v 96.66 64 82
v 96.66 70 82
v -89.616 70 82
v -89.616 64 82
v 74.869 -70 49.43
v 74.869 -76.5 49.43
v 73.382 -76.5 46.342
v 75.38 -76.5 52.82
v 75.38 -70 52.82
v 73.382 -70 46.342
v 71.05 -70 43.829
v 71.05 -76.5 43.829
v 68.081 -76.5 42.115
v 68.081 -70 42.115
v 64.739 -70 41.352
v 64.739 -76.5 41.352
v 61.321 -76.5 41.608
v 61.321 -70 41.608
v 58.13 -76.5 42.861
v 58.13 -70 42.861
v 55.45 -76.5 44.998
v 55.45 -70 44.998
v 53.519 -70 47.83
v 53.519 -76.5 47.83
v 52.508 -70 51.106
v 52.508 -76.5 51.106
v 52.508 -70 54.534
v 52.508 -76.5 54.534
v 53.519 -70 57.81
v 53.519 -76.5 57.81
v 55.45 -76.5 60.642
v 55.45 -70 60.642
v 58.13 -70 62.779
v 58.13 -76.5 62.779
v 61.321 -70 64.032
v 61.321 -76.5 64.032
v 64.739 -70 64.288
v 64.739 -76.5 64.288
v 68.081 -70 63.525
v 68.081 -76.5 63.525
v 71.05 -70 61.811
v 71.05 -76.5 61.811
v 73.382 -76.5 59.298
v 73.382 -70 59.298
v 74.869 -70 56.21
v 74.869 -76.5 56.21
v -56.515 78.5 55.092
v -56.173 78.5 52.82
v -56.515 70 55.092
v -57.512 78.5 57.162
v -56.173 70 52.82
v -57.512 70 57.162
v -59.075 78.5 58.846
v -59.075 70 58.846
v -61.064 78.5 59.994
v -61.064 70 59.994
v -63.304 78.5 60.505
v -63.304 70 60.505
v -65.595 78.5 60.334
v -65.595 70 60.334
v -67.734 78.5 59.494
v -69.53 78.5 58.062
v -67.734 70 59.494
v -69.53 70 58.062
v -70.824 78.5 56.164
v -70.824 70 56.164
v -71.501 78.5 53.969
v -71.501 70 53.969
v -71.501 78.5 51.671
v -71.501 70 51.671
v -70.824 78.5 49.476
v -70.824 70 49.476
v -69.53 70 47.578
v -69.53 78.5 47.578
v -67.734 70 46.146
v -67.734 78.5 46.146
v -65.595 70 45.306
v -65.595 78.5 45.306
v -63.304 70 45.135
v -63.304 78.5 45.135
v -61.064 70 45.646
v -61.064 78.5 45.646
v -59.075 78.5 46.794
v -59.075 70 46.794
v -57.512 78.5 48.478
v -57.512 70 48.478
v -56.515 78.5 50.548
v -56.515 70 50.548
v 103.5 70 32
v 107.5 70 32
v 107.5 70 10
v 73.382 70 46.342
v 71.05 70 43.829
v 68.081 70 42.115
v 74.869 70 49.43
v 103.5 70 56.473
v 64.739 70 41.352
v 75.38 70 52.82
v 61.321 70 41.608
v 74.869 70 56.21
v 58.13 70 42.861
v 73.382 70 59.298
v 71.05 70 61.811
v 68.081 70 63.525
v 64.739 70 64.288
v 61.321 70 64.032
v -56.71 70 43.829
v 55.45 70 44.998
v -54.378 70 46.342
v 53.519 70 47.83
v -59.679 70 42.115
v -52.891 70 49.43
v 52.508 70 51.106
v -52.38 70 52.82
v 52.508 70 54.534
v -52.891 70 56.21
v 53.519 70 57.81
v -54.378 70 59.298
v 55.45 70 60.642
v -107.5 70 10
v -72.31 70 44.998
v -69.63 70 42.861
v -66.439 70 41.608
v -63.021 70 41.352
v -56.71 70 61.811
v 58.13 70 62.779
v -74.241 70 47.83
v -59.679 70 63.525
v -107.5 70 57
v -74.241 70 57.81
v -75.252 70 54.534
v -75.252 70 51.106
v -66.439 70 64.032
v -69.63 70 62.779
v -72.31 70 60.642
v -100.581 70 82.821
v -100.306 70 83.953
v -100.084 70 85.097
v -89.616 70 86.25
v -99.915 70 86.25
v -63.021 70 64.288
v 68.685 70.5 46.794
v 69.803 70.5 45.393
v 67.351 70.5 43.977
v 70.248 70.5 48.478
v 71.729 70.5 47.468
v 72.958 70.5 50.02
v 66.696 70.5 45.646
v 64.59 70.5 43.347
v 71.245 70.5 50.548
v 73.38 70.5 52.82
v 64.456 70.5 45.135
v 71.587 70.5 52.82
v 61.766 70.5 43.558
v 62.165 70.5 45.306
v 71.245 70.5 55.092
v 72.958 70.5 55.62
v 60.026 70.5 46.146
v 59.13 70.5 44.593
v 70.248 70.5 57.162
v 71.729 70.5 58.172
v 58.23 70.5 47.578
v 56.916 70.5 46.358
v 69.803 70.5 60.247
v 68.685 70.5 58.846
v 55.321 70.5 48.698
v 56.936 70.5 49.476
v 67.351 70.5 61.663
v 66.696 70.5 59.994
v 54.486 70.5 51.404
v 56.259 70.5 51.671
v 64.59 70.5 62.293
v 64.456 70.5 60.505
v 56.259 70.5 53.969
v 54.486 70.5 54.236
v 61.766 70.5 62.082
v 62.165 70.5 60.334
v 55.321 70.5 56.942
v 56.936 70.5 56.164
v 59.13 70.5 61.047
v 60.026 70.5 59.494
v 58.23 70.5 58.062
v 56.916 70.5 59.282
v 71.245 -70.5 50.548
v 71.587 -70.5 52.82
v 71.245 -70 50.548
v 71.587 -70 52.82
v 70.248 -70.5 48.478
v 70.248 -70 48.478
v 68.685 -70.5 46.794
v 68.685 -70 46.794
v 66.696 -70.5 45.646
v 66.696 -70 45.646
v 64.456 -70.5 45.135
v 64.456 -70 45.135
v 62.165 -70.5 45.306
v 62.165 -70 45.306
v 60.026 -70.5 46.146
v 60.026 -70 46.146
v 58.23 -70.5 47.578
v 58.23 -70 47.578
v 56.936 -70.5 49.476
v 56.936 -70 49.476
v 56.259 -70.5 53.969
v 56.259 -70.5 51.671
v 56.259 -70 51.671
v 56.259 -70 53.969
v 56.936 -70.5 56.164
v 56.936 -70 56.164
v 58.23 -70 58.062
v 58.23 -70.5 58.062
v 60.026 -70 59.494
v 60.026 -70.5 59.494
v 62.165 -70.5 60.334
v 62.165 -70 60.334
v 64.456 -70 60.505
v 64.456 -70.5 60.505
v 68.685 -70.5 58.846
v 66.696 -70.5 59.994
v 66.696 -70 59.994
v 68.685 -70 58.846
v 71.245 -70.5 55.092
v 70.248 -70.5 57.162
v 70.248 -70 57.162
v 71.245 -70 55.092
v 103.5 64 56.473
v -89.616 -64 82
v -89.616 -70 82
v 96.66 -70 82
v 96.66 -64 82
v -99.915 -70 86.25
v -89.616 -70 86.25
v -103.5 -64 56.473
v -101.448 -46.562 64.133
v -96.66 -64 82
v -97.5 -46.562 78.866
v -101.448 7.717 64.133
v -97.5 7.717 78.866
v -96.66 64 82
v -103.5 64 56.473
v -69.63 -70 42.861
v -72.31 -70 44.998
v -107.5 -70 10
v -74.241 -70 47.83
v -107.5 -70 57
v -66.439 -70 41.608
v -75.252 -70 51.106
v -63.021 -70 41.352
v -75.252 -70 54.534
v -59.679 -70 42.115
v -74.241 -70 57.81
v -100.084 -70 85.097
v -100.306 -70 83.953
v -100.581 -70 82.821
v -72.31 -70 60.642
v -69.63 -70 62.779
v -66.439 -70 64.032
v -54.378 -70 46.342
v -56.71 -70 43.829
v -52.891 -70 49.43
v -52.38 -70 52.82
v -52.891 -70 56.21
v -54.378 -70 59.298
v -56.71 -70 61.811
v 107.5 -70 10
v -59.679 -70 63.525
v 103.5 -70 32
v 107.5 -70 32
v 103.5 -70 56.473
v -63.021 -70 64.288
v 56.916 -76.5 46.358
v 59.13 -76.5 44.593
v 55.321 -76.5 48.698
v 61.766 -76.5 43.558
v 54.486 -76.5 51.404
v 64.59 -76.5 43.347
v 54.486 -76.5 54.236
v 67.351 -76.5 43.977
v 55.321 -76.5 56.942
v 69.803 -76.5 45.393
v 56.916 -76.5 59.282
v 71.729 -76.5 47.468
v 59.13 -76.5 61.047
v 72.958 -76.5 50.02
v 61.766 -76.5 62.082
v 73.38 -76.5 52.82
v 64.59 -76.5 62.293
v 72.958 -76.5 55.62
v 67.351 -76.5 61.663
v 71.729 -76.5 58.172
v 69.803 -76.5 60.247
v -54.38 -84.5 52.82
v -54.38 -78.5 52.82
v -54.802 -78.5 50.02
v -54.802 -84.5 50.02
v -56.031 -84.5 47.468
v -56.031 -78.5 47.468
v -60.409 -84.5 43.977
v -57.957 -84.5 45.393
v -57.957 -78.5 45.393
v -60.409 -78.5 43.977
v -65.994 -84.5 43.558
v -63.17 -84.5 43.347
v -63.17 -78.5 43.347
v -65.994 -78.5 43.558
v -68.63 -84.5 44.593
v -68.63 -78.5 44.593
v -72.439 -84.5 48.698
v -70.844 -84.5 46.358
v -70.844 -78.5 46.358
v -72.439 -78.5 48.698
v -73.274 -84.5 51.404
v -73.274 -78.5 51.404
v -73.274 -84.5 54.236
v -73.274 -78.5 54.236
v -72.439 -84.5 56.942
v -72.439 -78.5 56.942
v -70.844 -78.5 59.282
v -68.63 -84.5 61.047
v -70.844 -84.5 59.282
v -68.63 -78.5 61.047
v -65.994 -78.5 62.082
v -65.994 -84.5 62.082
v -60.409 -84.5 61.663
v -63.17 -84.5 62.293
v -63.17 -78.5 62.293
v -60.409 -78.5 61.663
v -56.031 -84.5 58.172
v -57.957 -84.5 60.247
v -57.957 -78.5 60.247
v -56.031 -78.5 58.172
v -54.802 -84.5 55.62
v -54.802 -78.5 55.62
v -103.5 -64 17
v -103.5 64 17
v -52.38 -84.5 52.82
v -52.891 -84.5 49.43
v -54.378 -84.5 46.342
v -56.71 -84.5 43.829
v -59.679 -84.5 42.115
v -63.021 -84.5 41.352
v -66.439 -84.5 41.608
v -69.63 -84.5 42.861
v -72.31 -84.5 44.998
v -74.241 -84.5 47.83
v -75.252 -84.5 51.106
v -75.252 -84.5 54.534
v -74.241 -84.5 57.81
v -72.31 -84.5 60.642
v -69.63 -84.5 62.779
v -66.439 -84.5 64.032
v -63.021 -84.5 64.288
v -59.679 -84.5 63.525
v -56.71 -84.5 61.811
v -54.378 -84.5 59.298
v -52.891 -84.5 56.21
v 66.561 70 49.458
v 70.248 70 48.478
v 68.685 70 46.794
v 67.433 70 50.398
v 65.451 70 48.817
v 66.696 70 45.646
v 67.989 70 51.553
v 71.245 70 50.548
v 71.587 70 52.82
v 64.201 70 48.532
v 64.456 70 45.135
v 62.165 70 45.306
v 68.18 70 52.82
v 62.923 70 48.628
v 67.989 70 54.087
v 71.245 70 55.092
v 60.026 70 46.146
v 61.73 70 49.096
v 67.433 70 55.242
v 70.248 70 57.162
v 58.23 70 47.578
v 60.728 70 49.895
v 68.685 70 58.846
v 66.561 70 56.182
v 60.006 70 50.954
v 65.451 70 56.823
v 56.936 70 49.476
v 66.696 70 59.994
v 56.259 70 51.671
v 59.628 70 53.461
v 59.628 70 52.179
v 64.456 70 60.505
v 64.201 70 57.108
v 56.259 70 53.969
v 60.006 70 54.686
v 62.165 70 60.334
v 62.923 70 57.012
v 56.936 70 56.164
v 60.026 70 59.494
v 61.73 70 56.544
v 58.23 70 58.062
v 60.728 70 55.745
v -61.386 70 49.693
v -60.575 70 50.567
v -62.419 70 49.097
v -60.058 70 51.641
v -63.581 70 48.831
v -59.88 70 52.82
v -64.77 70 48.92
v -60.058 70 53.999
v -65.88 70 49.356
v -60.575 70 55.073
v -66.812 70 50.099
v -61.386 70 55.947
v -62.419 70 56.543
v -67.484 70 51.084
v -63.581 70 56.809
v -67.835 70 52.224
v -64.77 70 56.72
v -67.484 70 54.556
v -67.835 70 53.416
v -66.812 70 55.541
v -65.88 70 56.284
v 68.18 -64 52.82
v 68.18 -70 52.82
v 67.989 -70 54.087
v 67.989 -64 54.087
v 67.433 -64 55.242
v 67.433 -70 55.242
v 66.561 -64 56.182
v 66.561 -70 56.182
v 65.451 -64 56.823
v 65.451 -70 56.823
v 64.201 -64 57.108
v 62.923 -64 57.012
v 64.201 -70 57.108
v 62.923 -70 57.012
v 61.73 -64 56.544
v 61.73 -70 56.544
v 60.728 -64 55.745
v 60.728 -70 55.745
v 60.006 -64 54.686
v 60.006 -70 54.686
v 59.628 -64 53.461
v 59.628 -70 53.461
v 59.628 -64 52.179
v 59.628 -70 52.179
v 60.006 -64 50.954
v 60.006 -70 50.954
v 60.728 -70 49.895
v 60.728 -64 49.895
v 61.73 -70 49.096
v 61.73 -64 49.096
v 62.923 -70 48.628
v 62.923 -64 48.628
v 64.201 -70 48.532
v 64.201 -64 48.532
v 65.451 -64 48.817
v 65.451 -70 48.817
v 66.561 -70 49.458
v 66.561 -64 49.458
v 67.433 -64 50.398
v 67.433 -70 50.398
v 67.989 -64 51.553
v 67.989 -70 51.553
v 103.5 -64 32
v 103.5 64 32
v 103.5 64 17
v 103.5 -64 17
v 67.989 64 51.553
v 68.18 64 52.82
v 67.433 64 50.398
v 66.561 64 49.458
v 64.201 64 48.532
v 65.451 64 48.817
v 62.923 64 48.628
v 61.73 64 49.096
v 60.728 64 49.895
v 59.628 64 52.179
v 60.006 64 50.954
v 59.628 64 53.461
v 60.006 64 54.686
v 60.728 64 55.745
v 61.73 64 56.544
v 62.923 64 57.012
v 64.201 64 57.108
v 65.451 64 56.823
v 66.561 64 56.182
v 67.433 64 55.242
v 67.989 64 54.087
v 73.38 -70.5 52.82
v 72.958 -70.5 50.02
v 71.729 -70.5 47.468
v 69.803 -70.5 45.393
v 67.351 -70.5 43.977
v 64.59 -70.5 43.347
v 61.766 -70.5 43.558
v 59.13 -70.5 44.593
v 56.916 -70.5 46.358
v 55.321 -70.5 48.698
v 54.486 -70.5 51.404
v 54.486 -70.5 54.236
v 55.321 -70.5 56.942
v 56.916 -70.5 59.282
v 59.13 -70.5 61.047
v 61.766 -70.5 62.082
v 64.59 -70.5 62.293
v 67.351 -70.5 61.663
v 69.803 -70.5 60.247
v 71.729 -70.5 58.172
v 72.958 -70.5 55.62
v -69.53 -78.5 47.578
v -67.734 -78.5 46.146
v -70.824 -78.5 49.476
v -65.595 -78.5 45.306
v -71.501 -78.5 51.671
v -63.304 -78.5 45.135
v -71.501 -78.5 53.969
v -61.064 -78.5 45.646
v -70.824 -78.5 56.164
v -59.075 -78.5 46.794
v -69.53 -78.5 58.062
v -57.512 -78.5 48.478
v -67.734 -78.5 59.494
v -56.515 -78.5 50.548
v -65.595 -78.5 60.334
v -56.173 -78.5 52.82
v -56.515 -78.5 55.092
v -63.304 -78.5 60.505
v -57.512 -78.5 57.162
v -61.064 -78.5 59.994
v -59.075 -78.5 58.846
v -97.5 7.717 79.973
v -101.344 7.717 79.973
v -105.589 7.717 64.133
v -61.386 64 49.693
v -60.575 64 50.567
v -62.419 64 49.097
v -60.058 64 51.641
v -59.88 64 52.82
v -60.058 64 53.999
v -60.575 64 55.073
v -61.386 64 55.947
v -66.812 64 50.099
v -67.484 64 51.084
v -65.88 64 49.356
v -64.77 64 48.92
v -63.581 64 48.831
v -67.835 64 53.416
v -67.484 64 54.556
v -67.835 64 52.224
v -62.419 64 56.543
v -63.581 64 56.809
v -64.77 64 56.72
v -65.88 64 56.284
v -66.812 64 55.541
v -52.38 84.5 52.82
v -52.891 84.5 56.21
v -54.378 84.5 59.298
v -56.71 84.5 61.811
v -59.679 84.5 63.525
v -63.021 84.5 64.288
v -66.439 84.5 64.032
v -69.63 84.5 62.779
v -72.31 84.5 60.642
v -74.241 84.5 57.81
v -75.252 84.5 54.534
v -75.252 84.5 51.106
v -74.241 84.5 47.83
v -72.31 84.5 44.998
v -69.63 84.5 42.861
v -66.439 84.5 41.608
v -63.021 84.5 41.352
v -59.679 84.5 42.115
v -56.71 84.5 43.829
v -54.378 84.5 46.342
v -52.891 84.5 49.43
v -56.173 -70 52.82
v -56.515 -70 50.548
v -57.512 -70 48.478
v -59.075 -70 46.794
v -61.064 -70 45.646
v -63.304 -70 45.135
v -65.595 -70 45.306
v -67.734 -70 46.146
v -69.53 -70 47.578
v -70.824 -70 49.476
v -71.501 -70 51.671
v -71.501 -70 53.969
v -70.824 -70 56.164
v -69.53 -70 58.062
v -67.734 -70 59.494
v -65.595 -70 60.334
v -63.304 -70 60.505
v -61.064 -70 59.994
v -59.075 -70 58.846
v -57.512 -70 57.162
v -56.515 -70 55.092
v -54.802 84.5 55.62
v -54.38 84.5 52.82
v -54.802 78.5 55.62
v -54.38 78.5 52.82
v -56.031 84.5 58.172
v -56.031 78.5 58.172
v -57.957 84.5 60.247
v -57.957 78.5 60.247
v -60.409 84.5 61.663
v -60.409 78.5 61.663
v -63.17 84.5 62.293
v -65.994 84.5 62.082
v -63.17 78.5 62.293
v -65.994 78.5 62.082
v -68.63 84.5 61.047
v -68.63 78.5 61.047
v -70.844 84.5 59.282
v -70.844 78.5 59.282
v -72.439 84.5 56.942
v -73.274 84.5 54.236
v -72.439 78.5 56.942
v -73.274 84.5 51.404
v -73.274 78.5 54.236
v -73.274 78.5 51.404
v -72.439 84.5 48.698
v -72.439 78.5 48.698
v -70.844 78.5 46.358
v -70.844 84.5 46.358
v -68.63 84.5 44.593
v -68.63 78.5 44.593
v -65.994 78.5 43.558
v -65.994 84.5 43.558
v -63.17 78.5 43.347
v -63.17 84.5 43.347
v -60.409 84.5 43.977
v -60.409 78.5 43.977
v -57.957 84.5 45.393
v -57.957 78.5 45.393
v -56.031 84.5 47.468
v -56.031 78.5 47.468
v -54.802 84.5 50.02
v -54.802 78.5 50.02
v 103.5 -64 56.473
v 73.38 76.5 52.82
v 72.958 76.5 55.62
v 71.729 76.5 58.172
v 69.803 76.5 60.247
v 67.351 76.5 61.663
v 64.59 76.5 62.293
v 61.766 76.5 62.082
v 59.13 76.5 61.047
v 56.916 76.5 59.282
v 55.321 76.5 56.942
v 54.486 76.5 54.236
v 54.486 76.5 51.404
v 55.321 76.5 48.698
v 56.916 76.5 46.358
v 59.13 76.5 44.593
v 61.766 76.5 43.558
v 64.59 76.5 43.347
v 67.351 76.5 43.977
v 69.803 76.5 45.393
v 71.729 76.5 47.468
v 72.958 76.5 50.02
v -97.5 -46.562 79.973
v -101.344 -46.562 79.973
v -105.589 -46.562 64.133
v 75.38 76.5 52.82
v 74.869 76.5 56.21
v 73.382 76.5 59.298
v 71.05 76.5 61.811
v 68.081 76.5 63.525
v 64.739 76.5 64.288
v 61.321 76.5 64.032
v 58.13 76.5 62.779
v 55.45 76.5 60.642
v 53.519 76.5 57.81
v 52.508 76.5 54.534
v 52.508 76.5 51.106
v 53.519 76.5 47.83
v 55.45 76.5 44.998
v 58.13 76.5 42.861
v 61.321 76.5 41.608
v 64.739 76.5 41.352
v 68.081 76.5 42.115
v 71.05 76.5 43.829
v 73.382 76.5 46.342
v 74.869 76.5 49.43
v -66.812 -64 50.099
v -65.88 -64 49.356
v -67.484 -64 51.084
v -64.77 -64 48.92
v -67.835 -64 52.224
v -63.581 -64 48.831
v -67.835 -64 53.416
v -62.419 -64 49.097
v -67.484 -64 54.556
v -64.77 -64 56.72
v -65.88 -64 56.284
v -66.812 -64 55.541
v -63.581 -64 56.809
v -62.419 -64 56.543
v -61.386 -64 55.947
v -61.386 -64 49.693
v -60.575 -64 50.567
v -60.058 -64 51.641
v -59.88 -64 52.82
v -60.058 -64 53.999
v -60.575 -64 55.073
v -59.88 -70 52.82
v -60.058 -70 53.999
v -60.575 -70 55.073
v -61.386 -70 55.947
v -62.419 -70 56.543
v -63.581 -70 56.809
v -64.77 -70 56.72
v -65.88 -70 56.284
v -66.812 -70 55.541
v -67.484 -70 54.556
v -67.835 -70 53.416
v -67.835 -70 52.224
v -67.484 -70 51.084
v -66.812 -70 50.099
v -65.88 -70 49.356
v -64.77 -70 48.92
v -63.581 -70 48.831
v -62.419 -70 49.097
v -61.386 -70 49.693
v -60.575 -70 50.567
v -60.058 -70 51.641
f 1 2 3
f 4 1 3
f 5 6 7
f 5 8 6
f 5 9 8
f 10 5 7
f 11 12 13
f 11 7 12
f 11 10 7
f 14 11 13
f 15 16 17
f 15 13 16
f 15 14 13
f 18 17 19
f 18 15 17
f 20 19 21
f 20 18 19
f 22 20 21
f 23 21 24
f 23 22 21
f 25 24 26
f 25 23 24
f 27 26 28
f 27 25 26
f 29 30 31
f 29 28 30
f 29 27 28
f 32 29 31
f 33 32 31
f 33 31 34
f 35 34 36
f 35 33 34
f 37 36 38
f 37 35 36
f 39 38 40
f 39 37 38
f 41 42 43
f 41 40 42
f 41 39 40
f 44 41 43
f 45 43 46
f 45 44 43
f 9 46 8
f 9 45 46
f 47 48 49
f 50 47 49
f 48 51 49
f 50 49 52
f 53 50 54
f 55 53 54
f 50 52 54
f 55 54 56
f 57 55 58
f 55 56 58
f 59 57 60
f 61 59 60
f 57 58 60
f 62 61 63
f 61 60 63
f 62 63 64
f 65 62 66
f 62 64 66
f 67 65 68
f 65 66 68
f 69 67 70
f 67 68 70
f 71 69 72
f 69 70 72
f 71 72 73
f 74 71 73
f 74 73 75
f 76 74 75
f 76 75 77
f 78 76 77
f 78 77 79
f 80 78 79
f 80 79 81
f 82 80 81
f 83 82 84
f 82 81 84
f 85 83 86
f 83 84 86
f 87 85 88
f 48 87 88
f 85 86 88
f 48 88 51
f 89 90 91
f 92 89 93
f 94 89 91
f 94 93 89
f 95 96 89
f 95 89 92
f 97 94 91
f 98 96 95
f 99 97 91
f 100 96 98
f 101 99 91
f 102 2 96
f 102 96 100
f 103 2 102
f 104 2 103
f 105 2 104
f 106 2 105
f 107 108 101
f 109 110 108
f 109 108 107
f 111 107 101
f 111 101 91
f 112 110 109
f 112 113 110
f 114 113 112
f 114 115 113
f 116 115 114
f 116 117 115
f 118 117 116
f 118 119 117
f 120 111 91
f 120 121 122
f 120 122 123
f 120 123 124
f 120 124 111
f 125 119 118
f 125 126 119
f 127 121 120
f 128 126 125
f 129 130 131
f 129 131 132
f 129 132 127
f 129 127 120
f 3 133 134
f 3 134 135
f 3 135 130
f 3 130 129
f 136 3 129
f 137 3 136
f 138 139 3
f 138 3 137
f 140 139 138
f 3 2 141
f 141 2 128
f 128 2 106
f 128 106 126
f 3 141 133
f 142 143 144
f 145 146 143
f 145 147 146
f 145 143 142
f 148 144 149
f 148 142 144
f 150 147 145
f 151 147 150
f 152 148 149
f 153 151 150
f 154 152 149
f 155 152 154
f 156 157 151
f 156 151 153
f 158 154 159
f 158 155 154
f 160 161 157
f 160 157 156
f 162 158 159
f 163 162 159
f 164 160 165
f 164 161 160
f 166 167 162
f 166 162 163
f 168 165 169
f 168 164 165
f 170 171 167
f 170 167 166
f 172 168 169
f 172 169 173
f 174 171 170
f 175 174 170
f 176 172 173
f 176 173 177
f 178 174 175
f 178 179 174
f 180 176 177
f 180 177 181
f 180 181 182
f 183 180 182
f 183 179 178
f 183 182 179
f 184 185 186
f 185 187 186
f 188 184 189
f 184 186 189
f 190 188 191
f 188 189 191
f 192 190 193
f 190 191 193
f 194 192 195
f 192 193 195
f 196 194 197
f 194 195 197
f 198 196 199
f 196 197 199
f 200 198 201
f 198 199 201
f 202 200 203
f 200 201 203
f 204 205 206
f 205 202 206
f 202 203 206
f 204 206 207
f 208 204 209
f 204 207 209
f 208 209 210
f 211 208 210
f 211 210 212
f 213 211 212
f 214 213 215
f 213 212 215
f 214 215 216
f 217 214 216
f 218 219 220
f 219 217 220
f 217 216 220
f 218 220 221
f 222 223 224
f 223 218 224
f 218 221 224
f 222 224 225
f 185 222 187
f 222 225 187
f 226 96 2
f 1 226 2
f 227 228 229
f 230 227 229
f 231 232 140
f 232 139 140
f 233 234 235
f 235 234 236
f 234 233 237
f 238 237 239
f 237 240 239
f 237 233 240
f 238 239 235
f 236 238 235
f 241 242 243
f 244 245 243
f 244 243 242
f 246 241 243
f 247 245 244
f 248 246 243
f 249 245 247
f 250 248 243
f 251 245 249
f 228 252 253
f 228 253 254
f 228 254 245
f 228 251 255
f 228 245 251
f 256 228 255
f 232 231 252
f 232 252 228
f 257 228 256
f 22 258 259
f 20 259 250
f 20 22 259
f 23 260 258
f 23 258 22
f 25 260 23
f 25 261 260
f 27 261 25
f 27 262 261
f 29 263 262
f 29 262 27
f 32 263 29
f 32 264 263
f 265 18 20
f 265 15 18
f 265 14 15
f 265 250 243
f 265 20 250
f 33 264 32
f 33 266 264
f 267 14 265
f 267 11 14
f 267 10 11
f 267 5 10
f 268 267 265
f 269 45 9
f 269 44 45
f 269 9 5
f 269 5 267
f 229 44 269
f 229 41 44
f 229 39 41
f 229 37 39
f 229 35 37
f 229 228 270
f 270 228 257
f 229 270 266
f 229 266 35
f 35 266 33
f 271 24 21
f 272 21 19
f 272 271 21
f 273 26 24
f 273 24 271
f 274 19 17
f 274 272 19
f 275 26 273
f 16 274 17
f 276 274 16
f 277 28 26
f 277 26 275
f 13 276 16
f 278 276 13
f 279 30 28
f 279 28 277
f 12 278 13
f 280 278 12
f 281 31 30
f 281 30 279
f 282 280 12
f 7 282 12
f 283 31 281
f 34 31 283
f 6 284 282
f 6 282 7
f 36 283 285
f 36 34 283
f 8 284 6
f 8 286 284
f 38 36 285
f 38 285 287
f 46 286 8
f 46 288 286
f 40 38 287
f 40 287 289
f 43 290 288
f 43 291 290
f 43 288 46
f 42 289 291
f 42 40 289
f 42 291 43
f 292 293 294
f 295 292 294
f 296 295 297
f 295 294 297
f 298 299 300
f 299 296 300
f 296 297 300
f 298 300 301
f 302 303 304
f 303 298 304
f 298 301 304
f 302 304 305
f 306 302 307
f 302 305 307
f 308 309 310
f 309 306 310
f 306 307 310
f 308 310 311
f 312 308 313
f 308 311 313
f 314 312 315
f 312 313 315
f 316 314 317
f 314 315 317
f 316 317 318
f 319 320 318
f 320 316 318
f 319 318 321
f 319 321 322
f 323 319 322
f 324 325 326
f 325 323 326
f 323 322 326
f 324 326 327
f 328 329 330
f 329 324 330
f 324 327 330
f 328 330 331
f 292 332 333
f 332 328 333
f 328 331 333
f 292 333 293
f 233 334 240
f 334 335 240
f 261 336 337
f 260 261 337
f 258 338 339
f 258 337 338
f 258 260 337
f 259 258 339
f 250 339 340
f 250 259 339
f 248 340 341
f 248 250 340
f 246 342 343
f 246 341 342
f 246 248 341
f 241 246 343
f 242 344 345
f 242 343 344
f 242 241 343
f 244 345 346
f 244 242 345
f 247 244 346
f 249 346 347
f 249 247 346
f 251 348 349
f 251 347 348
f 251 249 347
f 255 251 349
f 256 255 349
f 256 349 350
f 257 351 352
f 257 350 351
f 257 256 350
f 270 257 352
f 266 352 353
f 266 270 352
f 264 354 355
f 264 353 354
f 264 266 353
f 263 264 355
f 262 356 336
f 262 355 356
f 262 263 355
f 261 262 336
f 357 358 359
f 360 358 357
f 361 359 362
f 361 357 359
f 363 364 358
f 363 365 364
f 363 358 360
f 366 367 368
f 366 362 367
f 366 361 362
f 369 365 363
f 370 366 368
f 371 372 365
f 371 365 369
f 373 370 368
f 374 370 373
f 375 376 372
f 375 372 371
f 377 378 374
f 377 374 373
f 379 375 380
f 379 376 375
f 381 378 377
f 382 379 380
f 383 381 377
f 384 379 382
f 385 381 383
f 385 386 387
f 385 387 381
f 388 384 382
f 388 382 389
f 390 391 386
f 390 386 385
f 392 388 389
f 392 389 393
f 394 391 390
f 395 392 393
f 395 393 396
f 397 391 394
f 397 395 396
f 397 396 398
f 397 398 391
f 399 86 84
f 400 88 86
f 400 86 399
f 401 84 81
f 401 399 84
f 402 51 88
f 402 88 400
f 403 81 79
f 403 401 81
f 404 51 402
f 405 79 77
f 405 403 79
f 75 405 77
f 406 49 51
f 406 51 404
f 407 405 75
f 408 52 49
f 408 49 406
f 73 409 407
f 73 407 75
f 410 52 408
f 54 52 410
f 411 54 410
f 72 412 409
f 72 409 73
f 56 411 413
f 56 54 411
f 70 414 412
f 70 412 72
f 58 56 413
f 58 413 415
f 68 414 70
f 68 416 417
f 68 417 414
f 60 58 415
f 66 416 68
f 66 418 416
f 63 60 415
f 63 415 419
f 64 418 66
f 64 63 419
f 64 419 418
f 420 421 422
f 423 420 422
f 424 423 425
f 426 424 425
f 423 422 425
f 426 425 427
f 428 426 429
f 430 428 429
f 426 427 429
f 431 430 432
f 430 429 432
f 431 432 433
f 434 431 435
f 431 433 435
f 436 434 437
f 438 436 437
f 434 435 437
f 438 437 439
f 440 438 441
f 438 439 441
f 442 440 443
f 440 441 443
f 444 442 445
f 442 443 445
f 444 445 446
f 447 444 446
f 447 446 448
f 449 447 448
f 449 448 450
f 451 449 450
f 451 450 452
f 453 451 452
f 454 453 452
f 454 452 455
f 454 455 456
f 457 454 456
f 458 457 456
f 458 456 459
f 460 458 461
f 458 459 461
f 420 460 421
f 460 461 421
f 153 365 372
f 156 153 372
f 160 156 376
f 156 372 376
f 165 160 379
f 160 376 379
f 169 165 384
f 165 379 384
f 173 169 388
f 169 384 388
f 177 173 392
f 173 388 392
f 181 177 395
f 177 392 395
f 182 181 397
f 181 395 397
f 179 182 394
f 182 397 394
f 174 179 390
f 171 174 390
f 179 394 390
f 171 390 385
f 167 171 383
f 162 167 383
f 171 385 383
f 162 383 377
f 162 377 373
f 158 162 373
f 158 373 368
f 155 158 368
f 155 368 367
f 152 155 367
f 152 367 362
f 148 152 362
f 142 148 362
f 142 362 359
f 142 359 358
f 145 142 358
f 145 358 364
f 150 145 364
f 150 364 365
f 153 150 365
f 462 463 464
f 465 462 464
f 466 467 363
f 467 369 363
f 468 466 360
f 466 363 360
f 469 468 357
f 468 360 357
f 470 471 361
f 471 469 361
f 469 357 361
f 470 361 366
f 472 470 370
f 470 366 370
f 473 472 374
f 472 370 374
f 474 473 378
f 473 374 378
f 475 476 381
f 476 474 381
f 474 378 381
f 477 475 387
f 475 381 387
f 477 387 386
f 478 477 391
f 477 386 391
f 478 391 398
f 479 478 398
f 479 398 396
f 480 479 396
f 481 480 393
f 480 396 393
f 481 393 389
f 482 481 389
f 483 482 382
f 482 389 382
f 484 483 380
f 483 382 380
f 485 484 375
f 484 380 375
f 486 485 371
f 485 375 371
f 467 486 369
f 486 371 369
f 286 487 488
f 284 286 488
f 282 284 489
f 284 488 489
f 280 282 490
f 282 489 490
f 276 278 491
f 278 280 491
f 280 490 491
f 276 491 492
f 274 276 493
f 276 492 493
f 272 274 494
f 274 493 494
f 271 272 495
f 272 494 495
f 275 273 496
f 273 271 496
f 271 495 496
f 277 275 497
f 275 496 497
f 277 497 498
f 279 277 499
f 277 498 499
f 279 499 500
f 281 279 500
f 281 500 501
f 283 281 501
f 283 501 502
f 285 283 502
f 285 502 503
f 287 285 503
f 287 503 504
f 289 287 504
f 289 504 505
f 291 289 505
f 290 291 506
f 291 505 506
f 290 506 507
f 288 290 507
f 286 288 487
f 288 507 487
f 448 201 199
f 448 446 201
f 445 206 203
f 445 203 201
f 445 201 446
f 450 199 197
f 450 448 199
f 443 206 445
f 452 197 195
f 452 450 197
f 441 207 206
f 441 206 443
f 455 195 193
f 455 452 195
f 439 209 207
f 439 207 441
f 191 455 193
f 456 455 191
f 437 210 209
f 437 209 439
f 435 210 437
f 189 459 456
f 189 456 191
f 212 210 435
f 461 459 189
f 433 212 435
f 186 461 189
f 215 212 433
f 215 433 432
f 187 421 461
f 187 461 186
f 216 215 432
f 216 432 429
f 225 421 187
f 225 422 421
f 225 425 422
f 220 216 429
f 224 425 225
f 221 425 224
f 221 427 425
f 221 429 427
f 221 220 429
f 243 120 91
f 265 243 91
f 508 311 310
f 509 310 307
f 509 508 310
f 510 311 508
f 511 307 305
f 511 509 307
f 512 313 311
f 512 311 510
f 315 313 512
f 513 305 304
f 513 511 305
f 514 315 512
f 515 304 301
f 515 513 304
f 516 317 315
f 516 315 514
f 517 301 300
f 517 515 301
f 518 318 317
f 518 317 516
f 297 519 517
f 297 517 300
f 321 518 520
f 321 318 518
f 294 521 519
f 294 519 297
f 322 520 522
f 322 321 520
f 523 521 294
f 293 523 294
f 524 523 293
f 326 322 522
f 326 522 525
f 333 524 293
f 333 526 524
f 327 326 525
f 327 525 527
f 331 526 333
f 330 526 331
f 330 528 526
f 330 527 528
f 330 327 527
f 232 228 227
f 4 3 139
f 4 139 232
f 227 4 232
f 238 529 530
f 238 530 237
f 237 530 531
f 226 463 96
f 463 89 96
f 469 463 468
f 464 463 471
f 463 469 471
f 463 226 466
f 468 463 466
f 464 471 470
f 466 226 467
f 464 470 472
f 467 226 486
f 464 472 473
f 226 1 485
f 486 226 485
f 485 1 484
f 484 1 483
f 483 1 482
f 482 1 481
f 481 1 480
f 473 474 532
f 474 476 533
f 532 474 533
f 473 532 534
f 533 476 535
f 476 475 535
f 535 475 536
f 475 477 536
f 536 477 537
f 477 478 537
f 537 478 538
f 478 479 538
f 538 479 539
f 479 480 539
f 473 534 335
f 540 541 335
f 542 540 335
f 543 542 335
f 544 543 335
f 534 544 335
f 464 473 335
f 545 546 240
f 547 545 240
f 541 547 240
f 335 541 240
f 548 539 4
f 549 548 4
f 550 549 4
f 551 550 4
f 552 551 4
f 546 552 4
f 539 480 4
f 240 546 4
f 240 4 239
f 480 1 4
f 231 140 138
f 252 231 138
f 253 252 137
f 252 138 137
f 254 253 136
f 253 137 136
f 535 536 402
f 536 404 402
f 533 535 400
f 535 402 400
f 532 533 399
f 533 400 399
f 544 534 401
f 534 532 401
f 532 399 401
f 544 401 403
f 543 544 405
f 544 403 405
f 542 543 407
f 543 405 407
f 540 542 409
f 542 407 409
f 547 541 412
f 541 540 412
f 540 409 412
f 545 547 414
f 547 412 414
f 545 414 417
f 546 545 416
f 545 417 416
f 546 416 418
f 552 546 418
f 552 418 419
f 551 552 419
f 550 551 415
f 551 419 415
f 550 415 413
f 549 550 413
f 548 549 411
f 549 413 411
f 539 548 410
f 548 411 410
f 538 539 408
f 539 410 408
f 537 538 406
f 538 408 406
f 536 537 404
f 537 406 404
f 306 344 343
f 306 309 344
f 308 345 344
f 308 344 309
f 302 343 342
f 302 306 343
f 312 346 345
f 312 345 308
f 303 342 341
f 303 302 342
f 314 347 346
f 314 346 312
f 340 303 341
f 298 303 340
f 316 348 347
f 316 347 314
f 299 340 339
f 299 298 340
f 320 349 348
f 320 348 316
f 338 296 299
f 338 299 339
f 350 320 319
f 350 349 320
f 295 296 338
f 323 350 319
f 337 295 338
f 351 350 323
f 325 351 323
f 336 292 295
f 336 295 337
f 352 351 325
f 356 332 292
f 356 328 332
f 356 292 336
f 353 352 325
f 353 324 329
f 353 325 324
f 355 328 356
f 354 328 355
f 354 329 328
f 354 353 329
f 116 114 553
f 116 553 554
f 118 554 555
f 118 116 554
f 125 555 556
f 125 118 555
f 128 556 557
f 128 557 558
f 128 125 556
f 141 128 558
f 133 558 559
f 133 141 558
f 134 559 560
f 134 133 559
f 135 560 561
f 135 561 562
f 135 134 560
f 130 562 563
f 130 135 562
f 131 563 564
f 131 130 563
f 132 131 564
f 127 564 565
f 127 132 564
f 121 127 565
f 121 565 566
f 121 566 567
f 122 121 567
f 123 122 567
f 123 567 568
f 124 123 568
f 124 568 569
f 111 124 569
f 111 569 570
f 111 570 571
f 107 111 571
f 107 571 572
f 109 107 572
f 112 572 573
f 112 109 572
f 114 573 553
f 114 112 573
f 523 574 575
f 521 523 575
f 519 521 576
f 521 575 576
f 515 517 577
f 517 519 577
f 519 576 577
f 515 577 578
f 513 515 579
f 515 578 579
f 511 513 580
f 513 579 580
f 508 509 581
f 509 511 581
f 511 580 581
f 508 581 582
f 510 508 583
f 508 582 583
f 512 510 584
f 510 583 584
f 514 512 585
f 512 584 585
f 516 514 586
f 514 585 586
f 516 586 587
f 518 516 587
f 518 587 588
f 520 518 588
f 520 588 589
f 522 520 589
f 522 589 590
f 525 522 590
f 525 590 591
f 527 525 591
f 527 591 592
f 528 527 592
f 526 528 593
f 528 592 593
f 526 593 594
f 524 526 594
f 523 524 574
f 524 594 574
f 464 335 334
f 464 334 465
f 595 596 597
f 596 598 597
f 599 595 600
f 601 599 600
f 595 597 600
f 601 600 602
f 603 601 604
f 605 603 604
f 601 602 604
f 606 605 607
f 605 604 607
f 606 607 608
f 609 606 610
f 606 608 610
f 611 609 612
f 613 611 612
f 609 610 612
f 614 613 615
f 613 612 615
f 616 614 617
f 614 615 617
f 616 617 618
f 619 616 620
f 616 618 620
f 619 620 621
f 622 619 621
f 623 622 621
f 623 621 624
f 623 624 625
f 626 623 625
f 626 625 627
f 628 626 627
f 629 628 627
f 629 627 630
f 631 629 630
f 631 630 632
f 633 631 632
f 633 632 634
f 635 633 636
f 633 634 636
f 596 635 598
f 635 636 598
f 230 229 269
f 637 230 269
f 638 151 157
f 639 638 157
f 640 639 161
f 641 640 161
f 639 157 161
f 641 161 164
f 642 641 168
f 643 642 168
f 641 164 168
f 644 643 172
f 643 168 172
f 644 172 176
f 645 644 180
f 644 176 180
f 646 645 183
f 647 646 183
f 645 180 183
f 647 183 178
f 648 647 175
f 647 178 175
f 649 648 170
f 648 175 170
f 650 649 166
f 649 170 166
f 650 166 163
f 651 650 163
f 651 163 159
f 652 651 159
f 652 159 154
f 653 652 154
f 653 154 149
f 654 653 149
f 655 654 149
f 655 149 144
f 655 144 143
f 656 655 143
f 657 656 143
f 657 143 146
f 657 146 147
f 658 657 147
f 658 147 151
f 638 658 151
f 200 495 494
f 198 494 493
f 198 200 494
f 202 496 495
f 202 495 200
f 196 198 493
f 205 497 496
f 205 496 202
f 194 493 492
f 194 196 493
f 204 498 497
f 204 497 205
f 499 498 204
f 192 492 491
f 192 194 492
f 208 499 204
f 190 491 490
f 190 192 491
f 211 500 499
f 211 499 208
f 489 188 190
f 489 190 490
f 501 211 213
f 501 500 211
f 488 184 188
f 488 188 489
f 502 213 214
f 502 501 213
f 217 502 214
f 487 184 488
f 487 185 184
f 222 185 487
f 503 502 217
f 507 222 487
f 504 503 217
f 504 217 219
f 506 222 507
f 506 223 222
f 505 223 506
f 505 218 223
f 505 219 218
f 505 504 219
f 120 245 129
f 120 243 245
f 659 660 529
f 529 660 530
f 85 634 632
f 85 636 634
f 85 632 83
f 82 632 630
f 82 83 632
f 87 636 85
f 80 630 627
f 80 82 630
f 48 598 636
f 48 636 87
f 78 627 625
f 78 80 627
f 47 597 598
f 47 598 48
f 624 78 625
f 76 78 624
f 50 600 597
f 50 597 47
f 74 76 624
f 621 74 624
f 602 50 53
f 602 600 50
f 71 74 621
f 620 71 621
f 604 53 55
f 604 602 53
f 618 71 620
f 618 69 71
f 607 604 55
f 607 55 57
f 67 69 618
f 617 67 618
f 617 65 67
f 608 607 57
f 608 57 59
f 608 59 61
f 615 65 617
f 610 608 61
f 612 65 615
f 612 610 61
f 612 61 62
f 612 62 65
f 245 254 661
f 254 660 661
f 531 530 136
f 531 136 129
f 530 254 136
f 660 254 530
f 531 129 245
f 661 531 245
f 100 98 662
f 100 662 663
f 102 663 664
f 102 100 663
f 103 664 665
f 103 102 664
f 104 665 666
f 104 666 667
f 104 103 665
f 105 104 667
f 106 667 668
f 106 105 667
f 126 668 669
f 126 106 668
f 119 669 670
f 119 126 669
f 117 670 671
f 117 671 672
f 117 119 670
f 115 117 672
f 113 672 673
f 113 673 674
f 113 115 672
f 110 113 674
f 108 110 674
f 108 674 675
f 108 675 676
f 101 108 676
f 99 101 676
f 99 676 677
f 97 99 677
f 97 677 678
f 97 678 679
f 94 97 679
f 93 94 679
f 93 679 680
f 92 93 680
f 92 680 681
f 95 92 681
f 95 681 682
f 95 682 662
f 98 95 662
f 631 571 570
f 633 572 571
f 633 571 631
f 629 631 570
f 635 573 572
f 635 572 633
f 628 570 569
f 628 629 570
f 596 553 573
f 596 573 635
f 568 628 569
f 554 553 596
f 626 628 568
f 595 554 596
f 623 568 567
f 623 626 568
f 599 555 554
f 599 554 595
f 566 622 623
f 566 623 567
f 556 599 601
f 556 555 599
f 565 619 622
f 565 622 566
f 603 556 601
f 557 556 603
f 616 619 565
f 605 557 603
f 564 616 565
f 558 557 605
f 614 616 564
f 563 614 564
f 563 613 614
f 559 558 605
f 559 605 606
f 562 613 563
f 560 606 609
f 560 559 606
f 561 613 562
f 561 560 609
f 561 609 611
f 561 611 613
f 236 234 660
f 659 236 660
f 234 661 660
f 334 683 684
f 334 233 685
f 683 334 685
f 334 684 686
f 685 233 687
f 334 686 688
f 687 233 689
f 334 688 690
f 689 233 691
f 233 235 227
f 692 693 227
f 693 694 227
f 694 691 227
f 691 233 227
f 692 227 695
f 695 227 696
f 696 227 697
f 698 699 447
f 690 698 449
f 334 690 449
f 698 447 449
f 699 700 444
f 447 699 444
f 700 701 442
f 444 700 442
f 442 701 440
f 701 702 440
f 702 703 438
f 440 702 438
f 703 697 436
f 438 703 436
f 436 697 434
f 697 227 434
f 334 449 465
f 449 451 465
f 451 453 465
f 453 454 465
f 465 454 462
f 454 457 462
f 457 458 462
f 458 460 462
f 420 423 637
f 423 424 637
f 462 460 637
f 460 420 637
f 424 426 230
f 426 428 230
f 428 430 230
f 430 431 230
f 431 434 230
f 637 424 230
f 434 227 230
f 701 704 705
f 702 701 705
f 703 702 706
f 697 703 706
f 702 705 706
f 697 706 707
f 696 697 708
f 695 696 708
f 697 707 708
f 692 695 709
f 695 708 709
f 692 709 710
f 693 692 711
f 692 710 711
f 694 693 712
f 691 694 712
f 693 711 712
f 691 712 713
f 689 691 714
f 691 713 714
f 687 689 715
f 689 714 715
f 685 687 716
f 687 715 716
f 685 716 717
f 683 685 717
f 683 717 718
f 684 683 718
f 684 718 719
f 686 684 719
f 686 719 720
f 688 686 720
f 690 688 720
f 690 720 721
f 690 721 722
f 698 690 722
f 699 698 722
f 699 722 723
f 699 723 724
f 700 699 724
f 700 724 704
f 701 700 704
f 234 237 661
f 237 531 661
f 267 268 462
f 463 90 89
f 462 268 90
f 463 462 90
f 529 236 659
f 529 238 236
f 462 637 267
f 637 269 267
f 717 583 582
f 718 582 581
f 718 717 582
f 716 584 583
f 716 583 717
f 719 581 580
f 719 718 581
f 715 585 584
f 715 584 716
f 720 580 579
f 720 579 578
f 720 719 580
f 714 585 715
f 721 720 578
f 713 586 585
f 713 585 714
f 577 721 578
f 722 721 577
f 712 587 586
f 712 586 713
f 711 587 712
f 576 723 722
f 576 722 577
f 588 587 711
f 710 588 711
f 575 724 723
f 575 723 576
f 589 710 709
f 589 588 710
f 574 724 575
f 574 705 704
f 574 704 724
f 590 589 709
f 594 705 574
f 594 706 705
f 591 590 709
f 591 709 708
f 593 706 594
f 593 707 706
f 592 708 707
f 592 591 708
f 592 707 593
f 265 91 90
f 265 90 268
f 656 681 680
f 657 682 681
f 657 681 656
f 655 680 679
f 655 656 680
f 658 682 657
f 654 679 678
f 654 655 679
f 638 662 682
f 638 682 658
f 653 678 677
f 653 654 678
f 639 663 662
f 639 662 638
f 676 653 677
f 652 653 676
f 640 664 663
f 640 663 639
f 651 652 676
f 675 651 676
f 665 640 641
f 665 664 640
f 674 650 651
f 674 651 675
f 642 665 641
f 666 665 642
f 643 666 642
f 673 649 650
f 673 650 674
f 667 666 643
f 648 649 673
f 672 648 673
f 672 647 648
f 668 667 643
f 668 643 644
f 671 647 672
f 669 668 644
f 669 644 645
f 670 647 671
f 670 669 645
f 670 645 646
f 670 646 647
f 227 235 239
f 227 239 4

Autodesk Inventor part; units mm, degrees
ref_plane "РабПлоскость1" through (0, 0, 10) normal (0, 0, 1) x (1, 0, 0)
sketch "Эскиз1" plane through (0, 0, 10) normal (0, 0, 1) x (1, 0, 0)
  line L0 (-107.5, 70) -> (107.5, 70)
  line L1 (107.5, 70) -> (107.5, -70)
  line L2 (107.5, -70) -> (-107.5, -70)
  line L3 (-107.5, -70) -> (-107.5, 70)
  line L4 (-107.5, 70) -> (107.5, -70) construction
  line L5 (107.5, 70) -> (-107.5, -70) construction
  point P0 (0, 0)
  dimension "d1" = 215
  dimension "d2" = 140
extrude "Выдавливание1" add sketch "Эскиз1" along normal blind 7
sketch "Эскиз2" plane through (-107.5, 70, 10) normal (0, 1, 0) x (1, 0, 0)
  line L0 (215, 0) -> (0, 0) projected
  line L1 (0, 0) -> (0, -7) projected
  line L2 (215, -7) -> (0, -7) projected
  line L3 (215, 0) -> (215, -7) projected
  line L4 (154.9795, -76.2499) -> (152.5795, -76.2499) projected
  line L5 (155.2294, -76) -> (154.9795, -76.2499) projected
  line L6 (159.8295, -76) -> (155.2294, -76) projected
  line L7 (160.0795, -76.2499) -> (159.8295, -76) projected
  line L8 (162.4795, -76.2499) -> (160.0795, -76.2499) projected
  line L9 (162.7294, -76) -> (162.4795, -76.2499) projected
  line L10 (167.3295, -76) -> (162.7294, -76) projected
  line L11 (167.5795, -76.2499) -> (167.3295, -76) projected
  line L12 (169.9795, -76.2499) -> (167.5795, -76.2499) projected
  line L13 (170.2294, -76) -> (169.9795, -76.2499) projected
  line L14 (174.8295, -76) -> (170.2294, -76) projected
  line L15 (175.0795, -76.2499) -> (174.8295, -76) projected
  line L16 (177.4795, -76.2499) -> (175.0795, -76.2499) projected
  line L17 (177.7294, -76) -> (177.4795, -76.2499) projected
  line L18 (182.3295, -76) -> (177.7294, -76) projected
  line L19 (182.5795, -76.2499) -> (182.3295, -76) projected
  line L20 (184.9795, -76.2499) -> (182.5795, -76.2499) projected
  line L21 (185.2294, -76) -> (184.9795, -76.2499) projected
  line L22 (189.8295, -76) -> (185.2294, -76) projected
  line L23 (190.0795, -76.2499) -> (189.8295, -76) projected
  line L24 (192.4795, -76.2499) -> (190.0795, -76.2499) projected
  line L25 (192.7294, -76) -> (192.4795, -76.2499) projected
  line L26 (197.3295, -76) -> (192.7294, -76) projected
  line L27 (197.5795, -76.2499) -> (197.3295, -76) projected
  line L28 (199.9795, -76.2499) -> (197.5795, -76.2499) projected
  line L29 (200.2294, -76) -> (199.9795, -76.2499) projected
  line L30 (204.8295, -76) -> (200.2294, -76) projected
  line L31 (205.0795, -76.2499) -> (204.8295, -76) projected
  line L32 (207.4152, -76.2499) -> (205.0795, -76.2499) projected
  arc A0 (208.0813, -72.8208) -> (207.4152, -76.2499) centre (232.2295, -79.2913) ccw projected
  line L33 (208.0813, -72.8208) -> (215, -47) projected
  line L34 (215, -22) -> (215, -47) projected
  line L35 (215, -22) -> (211, -22) projected
  line L36 (211, -22) -> (211, -46.4734) projected
  line L37 (211, -46.4734) -> (204.1602, -72) projected
  line L38 (204.1602, -72) -> (150.3397, -72) projected
  line L39 (150.3397, -72) -> (150.3397, -76) projected
  line L40 (152.3295, -76) -> (150.3397, -76) projected
  line L41 (152.5795, -76.2499) -> (152.3295, -76) projected
  line L42 (107.5, 0) -> (107.5, -94.8503)
  line L43 (15.0205, -76.2499) -> (17.4205, -76.2499)
  line L44 (7.5848, -76.2499) -> (9.9205, -76.2499)
  arc A1 (7.5848, -76.2499) -> (6.9187, -72.8208) centre (-17.2295, -79.2913) ccw
  line L45 (6.9187, -72.8208) -> (0, -47)
  line L46 (0, -22) -> (0, -47)
  line L47 (0, -22) -> (4, -22)
  line L48 (4, -22) -> (4, -46.4734)
  line L49 (4, -46.4734) -> (10.8398, -72)
  line L50 (10.8398, -72) -> (64.6603, -72)
  line L51 (215, -22) -> (211, -22)
  line L52 (211, -22) -> (211, -7)
  line L53 (211, -7) -> (215, -7)
  line L54 (215, -7) -> (215, -22)
  line L55 (4, -22) -> (0, -22)
  line L56 (0, -22) -> (0, -7)
  line L57 (0, -7) -> (4, -7)
  line L58 (4, -7) -> (4, -22)
  line L59 (17.8835, -76.2499) -> (7.5848, -76.2499)
  line L60 (10.8398, -72) -> (17.8835, -72)
  line L61 (17.8835, -72) -> (17.8835, -76.2499)
  point P0 (107.5, 10)
  point P1 (17.8835, -72)
extrude "Выдавливание2" add sketch "Эскиз2" against normal up to surface (140 mm away) contours L54 L35 L52 L2 | L2 L58 L47 L56 | L47 L48 L49 L50 L61 L59 L43 L44 A1 L45 L46
sketch "Эскиз3" plane through (-107.5, -70, 10) normal (0, -1, 0) x (1, 0, 0)
  line L0 (0, 0) -> (215, 0) projected
  line L1 (215, 0) -> (215, 22) projected
  line L2 (211, 22) -> (215, 22) projected
  line L3 (211, 7) -> (211, 22) projected
  line L4 (4, 7) -> (211, 7) projected
  line L5 (4, 46.4734) -> (4, 7) projected
  line L6 (10.8398, 72) -> (4, 46.4734) projected
  line L7 (17.8835, 72) -> (10.8398, 72) projected
  line L8 (17.8835, 76.2499) -> (17.8835, 72) projected
  line L9 (7.5848, 76.2499) -> (17.8835, 76.2499) projected
  arc A0 (6.9187, 72.8208) -> (7.5848, 76.2499) centre (-17.2295, 79.2913) ccw projected
  line L10 (0, 47) -> (6.9187, 72.8208) projected
  line L11 (0, 0) -> (0, 47) projected
  line L12 (205.0795, 76.2499) -> (207.4152, 76.2499) projected
  line L13 (204.8295, 76) -> (205.0795, 76.2499) projected
  line L14 (200.2294, 76) -> (204.8295, 76) projected
  line L15 (199.9795, 76.2499) -> (200.2294, 76) projected
  line L16 (197.5795, 76.2499) -> (199.9795, 76.2499) projected
  line L17 (197.3295, 76) -> (197.5795, 76.2499) projected
  line L18 (192.7294, 76) -> (197.3295, 76) projected
  line L19 (192.4795, 76.2499) -> (192.7294, 76) projected
  line L20 (190.0795, 76.2499) -> (192.4795, 76.2499) projected
  line L21 (189.8295, 76) -> (190.0795, 76.2499) projected
  line L22 (185.2294, 76) -> (189.8295, 76) projected
  line L23 (184.9795, 76.2499) -> (185.2294, 76) projected
  line L24 (182.5795, 76.2499) -> (184.9795, 76.2499) projected
  line L25 (182.3295, 76) -> (182.5795, 76.2499) projected
  line L26 (177.7294, 76) -> (182.3295, 76) projected
  line L27 (177.4795, 76.2499) -> (177.7294, 76) projected
  line L28 (175.0795, 76.2499) -> (177.4795, 76.2499) projected
  line L29 (174.8295, 76) -> (175.0795, 76.2499) projected
  line L30 (170.2294, 76) -> (174.8295, 76) projected
  line L31 (169.9795, 76.2499) -> (170.2294, 76) projected
  line L32 (167.5795, 76.2499) -> (169.9795, 76.2499) projected
  line L33 (167.3295, 76) -> (167.5795, 76.2499) projected
  line L34 (162.7294, 76) -> (167.3295, 76) projected
  line L35 (162.4795, 76.2499) -> (162.7294, 76) projected
  line L36 (160.0795, 76.2499) -> (162.4795, 76.2499) projected
  line L37 (159.8295, 76) -> (160.0795, 76.2499) projected
  line L38 (155.2294, 76) -> (159.8295, 76) projected
  line L39 (154.9795, 76.2499) -> (155.2294, 76) projected
  line L40 (152.5795, 76.2499) -> (154.9795, 76.2499) projected
  line L41 (152.3295, 76) -> (152.5795, 76.2499) projected
  line L42 (150.3397, 76) -> (152.3295, 76) projected
  line L43 (150.3397, 72) -> (150.3397, 76) projected
  line L44 (150.3397, 72) -> (204.1602, 72) projected
  line L45 (204.1602, 72) -> (211, 46.4734) projected
  line L46 (211, 46.4734) -> (211, 22) projected
  line L47 (211, 22) -> (215, 22) projected
  line L48 (215, 22) -> (215, 47) projected
  line L49 (215, 47) -> (208.0813, 72.8208) projected
  arc A1 (207.4152, 76.2499) -> (208.0813, 72.8208) centre (232.2295, 79.2913) ccw projected
  line L50 (17.8835, 76.2499) -> (207.9879, 76)
  line L51 (17.8835, 72) -> (150.3397, 72)
  circle A2 centre (43.62, 42.82) radius 4 projected
  circle A3 centre (171.38, 42.82) radius 4.3 projected
  point P0 (107.5, -10)
extrude "Выдавливание3" add sketch "Эскиз3" against normal blind 6 contours L3 L4 L5 L6 L7 L51 L44 L45 L46
sketch "Эскиз4" plane through (-107.5, -70, 10) normal (0, -1, 0) x (1, 0, 0)
  circle A0 centre (43.62, 42.82) radius 9.5 projected
  circle A1 centre (43.62, 42.82) radius 11.5
  point P0 (107.5, -10)
  dimension "d9" = 23
ref_plane "РабПлоскость2" through (-75.6513, -84.5, 41.0487) normal (0, -1, 0) x (0.941, 0, -0.3385)
extrude "Выдавливание4" add sketch "Эскиз4" along normal up to surface (14.5 mm away)
sketch "Эскиз5" plane through (-63.88, -70, 52.82) normal (0, -1, 0) x (1, 0, 0)
  circle A0 centre (0, 0) radius 7.707 projected
  circle A1 centre (0, 0) radius 9.5 projected
  point P0 (63.88, -52.82)
ref_plane "РабПлоскость3" through (-75.6513, -78.5, 41.0487) normal (0, 1, 0) x (0.3385, 0, 0.941)
extrude "Выдавливание5" add sketch "Эскиз5" along normal up to surface (8.5 mm away)
sketch "Эскиз6" plane through (-107.5, -70, 10) normal (0, -1, 0) x (1, 0, 0)
  point P0 (107.5, -10)
sketch "Эскиз7" plane through (-107.5, -70, 10) normal (0, -1, 0) x (1, 0, 0)
  circle A0 centre (171.38, 42.82) radius 7.707 projected
  circle A1 centre (171.38, 42.82) radius 9.5 projected
  point P0 (107.5, -10)
ref_plane "РабПлоскость4" through (51.3812, -70.5, 40.3212) normal (0, 1, 0) x (0.4829, 0, 0.8757)
extrude "Выдавливание6" add sketch "Эскиз7" along normal up to surface (0.5 mm away)
sketch "Эскиз8" plane through (-107.5, -70, 10) normal (0, -1, 0) x (1, 0, 0)
  circle A0 centre (171.38, 42.82) radius 9.5 projected
  circle A1 centre (171.38, 42.82) radius 11.5
  point P0 (107.5, -10)
  dimension "d16" = 23
ref_plane "РабПлоскость5" through (51.3812, -76.5, 40.3212) normal (0, -1, 0) x (0.8757, 0, -0.4829)
extrude "Выдавливание7" add sketch "Эскиз8" along normal up to surface (6.5 mm away)
mirror "Зеркальное отражение1" about plane through (0, 0, 0) normal (0, 1, 0) of "Выдавливание3", "Выдавливание4", "Выдавливание5", "Выдавливание6", "Выдавливание7"
sketch "Эскиз9" plane through (-107.5, -70, 10) normal (-1, 0, 0) x (0, 0, 1)
  line L0 (69.9727, 77.7173) -> (54.1331, 77.7173)
  line L1 (54.1331, 77.7173) -> (54.1331, 23.438)
  line L2 (54.1331, 23.438) -> (69.9727, 23.438)
  line L3 (69.9727, 23.438) -> (69.9727, 77.7173)
  point P0 (-10, 70)
extrude "Выдавливание8" cut sketch "Эскиз9" against normal blind 10
ref_plane "РабПлоскость6" through (-75.6513, 84.5, 41.0487) normal (0, -1, 0) x (0.941, 0, -0.3385)
ref_plane "РабПлоскость7" through (-75.6513, 78.5, 41.0487) normal (0, 1, 0) x (0.3385, 0, 0.941)
ref_plane "РабПлоскость8" through (51.3812, 70.5, 40.3212) normal (0, 1, 0) x (0.4829, 0, 0.8757)
ref_plane "РабПлоскость9" through (51.3812, 76.5, 40.3212) normal (0, -1, 0) x (0.8757, 0, -0.4829)
